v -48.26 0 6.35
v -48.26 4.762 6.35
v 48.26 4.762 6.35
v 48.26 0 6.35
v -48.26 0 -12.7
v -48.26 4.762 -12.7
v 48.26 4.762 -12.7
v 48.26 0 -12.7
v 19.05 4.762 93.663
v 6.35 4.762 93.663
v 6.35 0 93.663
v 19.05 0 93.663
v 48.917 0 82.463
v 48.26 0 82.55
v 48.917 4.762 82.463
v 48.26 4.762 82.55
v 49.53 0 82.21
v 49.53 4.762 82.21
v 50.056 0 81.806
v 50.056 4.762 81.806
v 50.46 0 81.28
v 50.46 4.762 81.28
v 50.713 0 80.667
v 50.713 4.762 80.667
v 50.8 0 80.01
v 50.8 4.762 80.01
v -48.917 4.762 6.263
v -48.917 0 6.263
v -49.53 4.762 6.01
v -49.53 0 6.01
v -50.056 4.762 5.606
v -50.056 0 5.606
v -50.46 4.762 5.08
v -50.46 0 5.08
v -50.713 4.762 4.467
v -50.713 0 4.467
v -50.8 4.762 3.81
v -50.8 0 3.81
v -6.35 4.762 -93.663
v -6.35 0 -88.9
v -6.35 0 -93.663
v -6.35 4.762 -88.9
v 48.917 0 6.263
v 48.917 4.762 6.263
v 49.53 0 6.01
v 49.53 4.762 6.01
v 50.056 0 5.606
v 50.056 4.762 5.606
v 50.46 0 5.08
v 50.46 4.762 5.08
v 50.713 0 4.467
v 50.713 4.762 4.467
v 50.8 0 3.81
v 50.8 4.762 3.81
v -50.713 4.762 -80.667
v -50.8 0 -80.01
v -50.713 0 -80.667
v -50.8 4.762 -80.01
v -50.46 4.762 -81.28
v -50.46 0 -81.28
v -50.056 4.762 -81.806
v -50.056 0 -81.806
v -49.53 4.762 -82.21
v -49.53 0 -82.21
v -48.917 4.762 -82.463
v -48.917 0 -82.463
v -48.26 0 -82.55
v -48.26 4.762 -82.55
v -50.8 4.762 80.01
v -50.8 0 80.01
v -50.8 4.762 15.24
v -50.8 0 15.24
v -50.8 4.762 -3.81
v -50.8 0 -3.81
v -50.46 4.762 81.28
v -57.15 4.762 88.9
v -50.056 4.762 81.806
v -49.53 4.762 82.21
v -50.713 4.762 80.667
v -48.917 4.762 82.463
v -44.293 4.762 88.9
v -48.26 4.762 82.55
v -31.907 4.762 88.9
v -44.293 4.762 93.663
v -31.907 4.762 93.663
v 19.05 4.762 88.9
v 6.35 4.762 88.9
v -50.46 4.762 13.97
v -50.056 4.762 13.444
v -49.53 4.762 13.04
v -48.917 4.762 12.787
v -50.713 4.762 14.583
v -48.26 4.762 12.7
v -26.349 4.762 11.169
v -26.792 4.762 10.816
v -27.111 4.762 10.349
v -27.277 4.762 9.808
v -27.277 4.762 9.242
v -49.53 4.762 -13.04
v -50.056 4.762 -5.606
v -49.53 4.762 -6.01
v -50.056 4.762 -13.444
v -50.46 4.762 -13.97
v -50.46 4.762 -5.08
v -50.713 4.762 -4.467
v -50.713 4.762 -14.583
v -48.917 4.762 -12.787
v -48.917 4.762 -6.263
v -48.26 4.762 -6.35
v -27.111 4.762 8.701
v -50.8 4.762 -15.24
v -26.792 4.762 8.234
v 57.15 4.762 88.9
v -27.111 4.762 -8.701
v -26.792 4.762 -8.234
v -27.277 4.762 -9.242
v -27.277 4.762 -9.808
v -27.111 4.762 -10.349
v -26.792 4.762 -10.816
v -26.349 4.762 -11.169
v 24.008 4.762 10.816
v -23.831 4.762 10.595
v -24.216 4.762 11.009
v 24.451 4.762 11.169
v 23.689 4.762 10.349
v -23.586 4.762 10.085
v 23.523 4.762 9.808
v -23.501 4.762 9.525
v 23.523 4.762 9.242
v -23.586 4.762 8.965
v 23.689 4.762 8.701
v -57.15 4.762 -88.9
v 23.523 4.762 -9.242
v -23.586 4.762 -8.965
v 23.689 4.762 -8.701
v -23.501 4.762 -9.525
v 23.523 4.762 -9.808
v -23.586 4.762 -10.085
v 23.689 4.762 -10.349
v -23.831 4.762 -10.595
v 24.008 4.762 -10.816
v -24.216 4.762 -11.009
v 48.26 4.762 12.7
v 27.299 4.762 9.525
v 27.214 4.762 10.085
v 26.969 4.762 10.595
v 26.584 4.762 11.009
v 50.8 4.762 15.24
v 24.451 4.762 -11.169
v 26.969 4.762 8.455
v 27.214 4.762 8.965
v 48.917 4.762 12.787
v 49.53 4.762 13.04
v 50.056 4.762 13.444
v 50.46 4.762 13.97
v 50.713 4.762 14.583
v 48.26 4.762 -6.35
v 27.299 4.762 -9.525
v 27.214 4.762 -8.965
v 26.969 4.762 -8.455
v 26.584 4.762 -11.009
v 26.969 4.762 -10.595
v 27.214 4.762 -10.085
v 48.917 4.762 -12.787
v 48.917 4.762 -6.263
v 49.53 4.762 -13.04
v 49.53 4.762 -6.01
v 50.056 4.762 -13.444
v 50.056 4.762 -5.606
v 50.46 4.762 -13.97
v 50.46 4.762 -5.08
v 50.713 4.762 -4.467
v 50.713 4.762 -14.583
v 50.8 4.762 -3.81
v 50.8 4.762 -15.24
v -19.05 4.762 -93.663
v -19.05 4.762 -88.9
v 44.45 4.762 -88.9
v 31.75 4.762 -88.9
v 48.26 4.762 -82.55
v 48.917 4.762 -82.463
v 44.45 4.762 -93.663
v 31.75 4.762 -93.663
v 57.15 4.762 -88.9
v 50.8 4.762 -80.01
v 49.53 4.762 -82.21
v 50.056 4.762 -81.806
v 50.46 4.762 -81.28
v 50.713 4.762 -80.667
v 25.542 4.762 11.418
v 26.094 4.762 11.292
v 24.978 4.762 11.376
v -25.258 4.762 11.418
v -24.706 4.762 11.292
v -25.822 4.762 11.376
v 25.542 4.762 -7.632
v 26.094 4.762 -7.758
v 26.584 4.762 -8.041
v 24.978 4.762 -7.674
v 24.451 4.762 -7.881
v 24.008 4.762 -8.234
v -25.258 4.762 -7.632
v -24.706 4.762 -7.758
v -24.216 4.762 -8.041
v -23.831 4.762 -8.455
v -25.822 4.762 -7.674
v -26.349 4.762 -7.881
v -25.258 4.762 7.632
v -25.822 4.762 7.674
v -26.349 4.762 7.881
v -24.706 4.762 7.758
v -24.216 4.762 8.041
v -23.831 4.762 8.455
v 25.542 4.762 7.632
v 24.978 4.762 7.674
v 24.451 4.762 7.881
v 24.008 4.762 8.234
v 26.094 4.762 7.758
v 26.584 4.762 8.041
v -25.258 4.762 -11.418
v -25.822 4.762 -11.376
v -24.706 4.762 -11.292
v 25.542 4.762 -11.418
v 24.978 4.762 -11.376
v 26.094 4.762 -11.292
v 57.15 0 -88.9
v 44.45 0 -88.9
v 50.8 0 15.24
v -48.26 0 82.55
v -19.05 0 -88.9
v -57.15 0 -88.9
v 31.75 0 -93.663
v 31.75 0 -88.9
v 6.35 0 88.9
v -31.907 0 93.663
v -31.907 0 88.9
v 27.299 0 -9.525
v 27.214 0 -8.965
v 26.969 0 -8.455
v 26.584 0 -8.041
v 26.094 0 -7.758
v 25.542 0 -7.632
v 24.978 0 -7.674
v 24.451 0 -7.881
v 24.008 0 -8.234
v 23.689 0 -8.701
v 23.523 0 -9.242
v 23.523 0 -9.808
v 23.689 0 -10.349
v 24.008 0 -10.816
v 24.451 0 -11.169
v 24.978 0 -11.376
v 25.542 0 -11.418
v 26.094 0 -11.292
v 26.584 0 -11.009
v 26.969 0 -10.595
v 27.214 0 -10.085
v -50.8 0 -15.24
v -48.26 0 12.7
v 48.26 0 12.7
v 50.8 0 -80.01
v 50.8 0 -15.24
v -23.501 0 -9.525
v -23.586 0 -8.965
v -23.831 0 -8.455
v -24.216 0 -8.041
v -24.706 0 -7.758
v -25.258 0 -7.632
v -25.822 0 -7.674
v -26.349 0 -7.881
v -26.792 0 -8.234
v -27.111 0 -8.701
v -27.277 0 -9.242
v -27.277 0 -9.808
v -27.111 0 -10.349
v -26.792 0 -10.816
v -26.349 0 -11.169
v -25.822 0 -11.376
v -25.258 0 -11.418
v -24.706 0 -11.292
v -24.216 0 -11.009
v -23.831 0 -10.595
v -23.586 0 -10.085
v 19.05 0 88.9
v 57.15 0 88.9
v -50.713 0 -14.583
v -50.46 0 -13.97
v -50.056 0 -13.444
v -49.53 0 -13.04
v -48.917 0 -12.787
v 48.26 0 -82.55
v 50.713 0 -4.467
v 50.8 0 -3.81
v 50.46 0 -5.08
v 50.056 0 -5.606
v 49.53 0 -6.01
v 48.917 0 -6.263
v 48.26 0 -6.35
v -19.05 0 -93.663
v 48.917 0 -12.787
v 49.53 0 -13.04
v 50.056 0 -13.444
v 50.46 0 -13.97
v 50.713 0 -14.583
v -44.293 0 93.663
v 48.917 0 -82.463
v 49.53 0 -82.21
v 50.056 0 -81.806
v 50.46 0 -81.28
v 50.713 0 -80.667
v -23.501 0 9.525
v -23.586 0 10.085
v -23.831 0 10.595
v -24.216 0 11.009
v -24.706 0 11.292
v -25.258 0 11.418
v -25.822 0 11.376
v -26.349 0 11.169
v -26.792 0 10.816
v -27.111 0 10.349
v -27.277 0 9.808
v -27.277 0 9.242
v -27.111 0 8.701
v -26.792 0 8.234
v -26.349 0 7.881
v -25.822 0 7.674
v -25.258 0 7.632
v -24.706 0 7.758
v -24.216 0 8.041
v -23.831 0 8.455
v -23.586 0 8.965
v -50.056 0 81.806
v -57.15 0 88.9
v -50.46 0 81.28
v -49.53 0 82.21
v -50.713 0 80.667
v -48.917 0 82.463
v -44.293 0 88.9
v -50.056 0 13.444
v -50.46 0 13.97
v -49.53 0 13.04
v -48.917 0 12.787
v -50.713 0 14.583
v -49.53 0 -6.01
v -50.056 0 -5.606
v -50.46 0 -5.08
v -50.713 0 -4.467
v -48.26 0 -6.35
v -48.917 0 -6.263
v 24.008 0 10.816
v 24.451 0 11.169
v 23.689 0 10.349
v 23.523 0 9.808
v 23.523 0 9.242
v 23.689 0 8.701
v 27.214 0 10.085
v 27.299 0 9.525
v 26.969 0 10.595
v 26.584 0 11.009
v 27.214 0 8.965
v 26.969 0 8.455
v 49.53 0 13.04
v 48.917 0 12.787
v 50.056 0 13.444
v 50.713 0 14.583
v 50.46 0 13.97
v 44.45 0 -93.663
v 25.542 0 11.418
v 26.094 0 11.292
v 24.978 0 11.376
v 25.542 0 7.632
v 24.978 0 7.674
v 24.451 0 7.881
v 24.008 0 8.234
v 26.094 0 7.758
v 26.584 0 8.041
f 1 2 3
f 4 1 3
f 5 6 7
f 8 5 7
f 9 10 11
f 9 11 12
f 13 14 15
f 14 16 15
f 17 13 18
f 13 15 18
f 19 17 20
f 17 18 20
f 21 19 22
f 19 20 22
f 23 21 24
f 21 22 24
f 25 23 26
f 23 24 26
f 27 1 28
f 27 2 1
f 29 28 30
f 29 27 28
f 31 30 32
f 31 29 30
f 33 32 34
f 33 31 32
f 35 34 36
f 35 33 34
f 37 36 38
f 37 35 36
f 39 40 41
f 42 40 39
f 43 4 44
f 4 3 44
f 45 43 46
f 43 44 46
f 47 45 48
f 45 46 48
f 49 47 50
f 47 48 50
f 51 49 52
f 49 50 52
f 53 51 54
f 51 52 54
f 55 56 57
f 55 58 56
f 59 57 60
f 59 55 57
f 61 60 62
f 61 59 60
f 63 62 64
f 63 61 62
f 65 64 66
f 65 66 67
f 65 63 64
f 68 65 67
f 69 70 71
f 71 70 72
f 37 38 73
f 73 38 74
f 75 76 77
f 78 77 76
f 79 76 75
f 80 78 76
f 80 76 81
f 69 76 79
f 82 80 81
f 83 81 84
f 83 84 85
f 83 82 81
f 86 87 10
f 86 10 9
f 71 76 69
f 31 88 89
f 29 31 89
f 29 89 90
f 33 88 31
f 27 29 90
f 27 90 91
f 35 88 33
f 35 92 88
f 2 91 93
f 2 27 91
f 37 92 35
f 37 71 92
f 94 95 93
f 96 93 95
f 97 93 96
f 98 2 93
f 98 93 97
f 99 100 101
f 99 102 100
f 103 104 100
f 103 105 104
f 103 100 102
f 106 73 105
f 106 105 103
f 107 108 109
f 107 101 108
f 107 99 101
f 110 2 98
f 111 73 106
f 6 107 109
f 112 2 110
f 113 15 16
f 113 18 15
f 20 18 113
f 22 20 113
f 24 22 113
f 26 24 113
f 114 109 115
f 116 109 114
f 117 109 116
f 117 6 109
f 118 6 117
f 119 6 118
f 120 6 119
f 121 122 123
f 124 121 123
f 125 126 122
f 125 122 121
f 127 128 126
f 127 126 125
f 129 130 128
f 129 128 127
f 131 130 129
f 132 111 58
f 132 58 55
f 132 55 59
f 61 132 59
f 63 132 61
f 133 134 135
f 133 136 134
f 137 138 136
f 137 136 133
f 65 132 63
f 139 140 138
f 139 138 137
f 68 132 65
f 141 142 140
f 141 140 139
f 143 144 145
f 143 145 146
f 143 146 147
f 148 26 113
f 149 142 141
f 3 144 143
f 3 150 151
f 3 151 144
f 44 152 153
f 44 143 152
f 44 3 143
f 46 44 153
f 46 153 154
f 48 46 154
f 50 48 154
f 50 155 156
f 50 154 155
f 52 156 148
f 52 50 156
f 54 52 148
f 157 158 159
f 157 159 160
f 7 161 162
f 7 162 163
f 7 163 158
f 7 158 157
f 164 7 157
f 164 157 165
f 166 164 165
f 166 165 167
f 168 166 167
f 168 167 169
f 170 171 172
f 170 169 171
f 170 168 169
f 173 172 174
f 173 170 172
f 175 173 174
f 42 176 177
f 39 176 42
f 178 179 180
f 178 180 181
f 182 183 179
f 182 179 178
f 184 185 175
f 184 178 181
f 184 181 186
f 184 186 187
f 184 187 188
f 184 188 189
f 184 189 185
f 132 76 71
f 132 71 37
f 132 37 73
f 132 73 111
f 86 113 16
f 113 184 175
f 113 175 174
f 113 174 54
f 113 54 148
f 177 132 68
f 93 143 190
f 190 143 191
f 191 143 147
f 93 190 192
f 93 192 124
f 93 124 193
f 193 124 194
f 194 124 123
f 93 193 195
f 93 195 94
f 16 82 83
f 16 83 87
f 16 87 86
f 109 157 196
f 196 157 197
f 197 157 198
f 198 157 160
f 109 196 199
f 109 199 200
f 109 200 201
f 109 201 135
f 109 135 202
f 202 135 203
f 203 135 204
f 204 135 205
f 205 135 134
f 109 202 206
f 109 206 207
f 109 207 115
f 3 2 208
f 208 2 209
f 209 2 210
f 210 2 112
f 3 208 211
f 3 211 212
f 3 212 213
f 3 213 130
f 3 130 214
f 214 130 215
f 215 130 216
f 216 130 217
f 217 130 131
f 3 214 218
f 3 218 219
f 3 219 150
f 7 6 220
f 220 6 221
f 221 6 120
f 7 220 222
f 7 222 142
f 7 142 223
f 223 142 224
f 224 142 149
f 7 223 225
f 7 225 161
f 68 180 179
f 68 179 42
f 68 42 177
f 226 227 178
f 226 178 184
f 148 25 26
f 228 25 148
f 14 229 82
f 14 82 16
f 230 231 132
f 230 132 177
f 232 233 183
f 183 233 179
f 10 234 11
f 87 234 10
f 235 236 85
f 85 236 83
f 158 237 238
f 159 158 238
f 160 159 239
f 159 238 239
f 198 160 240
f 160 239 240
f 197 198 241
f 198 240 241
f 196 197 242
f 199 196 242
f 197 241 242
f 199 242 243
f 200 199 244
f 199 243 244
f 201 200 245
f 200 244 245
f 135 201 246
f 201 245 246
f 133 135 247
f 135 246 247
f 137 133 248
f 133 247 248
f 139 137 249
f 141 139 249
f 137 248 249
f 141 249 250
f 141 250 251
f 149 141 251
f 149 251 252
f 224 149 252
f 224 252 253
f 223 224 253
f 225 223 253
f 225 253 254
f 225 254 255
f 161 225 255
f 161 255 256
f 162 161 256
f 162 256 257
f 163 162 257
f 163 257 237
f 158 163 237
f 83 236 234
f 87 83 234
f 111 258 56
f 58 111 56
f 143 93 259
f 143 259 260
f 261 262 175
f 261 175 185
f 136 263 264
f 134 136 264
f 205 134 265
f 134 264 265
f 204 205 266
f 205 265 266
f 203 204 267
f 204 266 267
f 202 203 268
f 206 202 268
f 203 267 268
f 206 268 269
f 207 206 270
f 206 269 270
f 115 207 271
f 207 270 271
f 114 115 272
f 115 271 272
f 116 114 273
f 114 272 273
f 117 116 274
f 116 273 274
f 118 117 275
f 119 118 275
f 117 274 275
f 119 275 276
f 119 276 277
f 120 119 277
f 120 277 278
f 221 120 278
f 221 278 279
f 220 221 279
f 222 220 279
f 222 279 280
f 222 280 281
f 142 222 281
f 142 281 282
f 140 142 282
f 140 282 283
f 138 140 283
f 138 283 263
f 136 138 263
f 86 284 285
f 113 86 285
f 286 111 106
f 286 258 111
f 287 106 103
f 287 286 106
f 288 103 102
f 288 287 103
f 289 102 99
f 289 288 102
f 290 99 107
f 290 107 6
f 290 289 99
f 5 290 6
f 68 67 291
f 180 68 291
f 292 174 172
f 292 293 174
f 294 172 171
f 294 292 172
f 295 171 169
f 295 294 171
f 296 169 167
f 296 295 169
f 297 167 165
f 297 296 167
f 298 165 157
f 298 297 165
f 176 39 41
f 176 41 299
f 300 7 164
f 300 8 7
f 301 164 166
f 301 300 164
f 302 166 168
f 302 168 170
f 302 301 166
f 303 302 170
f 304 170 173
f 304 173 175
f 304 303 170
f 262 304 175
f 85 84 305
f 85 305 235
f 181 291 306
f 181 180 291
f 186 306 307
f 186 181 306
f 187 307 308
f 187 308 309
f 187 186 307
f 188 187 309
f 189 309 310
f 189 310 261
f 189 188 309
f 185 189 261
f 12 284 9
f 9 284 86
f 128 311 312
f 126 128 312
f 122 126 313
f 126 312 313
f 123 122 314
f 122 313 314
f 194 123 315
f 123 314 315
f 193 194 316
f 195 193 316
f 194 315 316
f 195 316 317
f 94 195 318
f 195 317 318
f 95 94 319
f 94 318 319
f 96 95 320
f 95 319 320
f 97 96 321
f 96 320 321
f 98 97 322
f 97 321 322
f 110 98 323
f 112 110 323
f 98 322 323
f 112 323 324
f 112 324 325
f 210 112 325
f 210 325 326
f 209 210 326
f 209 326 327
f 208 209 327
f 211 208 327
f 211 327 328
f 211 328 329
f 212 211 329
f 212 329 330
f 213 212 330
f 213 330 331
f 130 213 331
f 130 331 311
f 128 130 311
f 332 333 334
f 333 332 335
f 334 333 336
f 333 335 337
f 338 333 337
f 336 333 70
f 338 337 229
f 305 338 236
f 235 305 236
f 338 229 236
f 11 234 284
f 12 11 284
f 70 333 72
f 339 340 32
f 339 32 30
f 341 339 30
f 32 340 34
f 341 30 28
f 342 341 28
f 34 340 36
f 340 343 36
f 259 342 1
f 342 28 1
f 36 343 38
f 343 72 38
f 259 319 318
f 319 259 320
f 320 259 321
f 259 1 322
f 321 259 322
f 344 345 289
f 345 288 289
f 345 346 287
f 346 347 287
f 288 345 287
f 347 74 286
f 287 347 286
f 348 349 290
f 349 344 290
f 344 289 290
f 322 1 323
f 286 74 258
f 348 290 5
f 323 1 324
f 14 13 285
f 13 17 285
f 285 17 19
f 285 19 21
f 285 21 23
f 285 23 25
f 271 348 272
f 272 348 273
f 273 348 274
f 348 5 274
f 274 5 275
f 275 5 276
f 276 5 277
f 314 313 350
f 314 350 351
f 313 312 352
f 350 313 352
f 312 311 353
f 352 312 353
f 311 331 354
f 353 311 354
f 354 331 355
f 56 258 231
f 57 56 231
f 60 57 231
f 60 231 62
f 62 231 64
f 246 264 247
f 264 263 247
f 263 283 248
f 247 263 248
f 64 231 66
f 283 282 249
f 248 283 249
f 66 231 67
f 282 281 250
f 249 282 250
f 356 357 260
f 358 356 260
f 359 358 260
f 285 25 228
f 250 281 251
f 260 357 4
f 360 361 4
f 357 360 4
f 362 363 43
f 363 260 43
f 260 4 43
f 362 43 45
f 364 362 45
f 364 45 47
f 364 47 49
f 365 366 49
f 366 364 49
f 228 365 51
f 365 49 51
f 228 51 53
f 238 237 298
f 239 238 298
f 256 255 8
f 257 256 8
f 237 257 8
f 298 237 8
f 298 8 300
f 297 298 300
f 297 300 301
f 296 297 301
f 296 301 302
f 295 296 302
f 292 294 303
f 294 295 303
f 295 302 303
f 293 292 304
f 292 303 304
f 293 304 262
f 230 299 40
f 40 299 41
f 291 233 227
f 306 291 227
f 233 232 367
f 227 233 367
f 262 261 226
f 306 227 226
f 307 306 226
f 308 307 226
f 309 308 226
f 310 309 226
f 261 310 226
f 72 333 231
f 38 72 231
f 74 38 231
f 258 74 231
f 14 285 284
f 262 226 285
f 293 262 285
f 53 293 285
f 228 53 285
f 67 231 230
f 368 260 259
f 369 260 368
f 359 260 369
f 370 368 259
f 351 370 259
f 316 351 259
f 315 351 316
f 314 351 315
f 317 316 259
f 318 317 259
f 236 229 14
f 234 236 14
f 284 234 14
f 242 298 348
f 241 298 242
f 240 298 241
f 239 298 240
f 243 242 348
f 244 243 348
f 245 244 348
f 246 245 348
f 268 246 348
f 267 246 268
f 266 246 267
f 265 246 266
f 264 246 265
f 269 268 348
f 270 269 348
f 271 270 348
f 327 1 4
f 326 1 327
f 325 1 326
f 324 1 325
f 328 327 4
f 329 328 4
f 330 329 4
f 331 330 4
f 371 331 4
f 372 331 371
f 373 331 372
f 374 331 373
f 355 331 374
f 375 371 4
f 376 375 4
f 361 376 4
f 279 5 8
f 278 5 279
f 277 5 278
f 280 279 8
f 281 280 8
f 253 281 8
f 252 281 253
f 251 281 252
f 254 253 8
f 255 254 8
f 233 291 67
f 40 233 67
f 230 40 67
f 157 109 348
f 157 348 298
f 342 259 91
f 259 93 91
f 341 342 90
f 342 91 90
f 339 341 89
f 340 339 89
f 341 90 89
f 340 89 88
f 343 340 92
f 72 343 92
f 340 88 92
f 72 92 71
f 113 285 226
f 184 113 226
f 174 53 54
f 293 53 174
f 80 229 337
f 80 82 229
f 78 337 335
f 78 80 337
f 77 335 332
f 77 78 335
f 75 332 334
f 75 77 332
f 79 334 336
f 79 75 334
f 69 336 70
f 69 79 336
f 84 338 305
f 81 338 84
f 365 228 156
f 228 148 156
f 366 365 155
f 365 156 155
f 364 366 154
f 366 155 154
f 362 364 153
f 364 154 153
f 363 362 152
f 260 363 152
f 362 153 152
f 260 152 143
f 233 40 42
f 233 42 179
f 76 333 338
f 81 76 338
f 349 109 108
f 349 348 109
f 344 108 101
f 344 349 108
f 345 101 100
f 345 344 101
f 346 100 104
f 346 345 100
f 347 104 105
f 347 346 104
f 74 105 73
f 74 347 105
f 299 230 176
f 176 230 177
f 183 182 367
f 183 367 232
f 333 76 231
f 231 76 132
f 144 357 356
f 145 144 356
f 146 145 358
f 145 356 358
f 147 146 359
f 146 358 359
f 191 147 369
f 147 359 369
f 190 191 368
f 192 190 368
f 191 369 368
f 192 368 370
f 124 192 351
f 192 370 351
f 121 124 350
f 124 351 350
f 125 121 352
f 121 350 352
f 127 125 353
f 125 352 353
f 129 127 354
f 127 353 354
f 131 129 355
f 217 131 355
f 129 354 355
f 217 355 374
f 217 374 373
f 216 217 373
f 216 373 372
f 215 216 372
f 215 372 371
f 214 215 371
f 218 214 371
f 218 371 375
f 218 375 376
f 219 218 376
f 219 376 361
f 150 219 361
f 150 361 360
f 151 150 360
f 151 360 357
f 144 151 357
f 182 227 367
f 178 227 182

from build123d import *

# Parameters (mm, degrees)
SKETCH1_W                 = 114.3
SKETCH1_H                 = 177.8
SKETCH1_W_2               = 101.6
SKETCH1_H_2               = 165.1
BOSS_EXTRUDE1_DEPTH       = 4.7625
SKETCH2_W                 = 12.38677804
SKETCH2_H                 = 4.7625
SKETCH2_W_2               = 12.7
BOSS_EXTRUDE2_DEPTH       = 4.7625
SKETCH3_W                 = 12.7
SKETCH3_H                 = 4.7625
BOSS_EXTRUDE3_DEPTH       = 4.7625
FILLET1_R                 = 2.54
SKETCH4_W                 = 101.6
SKETCH4_H                 = 6.35
SKETCH4_W_2               = 114.3
BOSS_EXTRUDE4_DEPTH       = 4.7625
FILLET2_R                 = 2.54
F_6_CLEARANCE_HOLE1_D     = 3.7973
F_6_CLEARANCE_HOLE1_DEPTH = 25.4
F_6_CLEARANCE_HOLE1_TIP   = 1.140824014


with BuildPart() as part:
    # Sketch1 → Boss-Extrude1 (new body)
    with BuildSketch(Plane(origin=(0, 0, 0), x_dir=(1, 0, 0), z_dir=(0, 1, 0))):
        Rectangle(SKETCH1_W, SKETCH1_H)
        Rectangle(SKETCH1_W_2, SKETCH1_H_2, mode=Mode.SUBTRACT)
    extrude(amount=BOSS_EXTRUDE1_DEPTH)

    # Sketch2 → Boss-Extrude2 (add)
    with BuildSketch(Plane.XY.offset(88.9)):
        with Locations((-38.1, 2.38125)):
            Rectangle(SKETCH2_W, SKETCH2_H)
        with Locations((12.7, 2.38125)):
            Rectangle(SKETCH2_W_2, SKETCH2_H)
    extrude(amount=BOSS_EXTRUDE2_DEPTH)

    # Sketch3 → Boss-Extrude3 (add)
    with BuildSketch(Plane(origin=(0, 0, -88.9), x_dir=(-1, 0, 0), z_dir=(0, 0, -1))):
        with Locations((-38.1, 2.38125)):
            Rectangle(SKETCH3_W, SKETCH3_H)
        with Locations((12.7, 2.38125)):
            Rectangle(SKETCH3_W, SKETCH3_H)
    extrude(amount=BOSS_EXTRUDE3_DEPTH)

    # Fillet1
    fillet1_edges = [part.edges().sort_by_distance(p)[0] for p in [
        (50.8, 2.38125, 82.55),
        (50.8, 2.38125, -82.55),
        (-50.8, 2.38125, -82.55),
        (-50.8, 2.38125, 82.55),
    ]]
    fillet(fillet1_edges, radius=FILLET1_R)

    # Sketch4 → Boss-Extrude4 (add)
    with BuildSketch(Plane(origin=(0, 4.7625, 0), x_dir=(1, 0, 0), z_dir=(0, 1, 0))):
        with Locations((0, 9.525)):
            Rectangle(SKETCH4_W, SKETCH4_H)
        with Locations((0, -9.525)):
            Rectangle(SKETCH4_W_2, SKETCH4_H)
    extrude(amount=-BOSS_EXTRUDE4_DEPTH)

    # Fillet2
    fillet2_edges = [part.edges().sort_by_distance(p)[0] for p in [
        (-50.8, 2.38125, -6.35),
        (-50.8, 2.38125, -12.7),
        (50.8, 2.38125, -12.7),
        (50.8, 2.38125, -6.35),
        (-50.8, 2.38125, 12.7),
        (-50.8, 2.38125, 6.35),
        (50.8, 2.38125, 6.35),
        (50.8, 2.38125, 12.7),
    ]]
    fillet(fillet2_edges, radius=FILLET2_R)

    # #6 Clearance Hole1
    with Locations(Plane(origin=(0, 4.7625, 0), x_dir=(-1, 0, 0), z_dir=(0, 1, 0))):
        with Locations((25.4, -9.525), (25.4, 9.525), (-25.4, 9.525), (-25.4, -9.525)):
            Hole(F_6_CLEARANCE_HOLE1_D / 2, depth=F_6_CLEARANCE_HOLE1_DEPTH)
            with Locations((0, 0, -(F_6_CLEARANCE_HOLE1_DEPTH + F_6_CLEARANCE_HOLE1_TIP / 2))):  # 118° drill point
                Cone(0, F_6_CLEARANCE_HOLE1_D / 2, F_6_CLEARANCE_HOLE1_TIP, mode=Mode.SUBTRACT)


solid = part.part
